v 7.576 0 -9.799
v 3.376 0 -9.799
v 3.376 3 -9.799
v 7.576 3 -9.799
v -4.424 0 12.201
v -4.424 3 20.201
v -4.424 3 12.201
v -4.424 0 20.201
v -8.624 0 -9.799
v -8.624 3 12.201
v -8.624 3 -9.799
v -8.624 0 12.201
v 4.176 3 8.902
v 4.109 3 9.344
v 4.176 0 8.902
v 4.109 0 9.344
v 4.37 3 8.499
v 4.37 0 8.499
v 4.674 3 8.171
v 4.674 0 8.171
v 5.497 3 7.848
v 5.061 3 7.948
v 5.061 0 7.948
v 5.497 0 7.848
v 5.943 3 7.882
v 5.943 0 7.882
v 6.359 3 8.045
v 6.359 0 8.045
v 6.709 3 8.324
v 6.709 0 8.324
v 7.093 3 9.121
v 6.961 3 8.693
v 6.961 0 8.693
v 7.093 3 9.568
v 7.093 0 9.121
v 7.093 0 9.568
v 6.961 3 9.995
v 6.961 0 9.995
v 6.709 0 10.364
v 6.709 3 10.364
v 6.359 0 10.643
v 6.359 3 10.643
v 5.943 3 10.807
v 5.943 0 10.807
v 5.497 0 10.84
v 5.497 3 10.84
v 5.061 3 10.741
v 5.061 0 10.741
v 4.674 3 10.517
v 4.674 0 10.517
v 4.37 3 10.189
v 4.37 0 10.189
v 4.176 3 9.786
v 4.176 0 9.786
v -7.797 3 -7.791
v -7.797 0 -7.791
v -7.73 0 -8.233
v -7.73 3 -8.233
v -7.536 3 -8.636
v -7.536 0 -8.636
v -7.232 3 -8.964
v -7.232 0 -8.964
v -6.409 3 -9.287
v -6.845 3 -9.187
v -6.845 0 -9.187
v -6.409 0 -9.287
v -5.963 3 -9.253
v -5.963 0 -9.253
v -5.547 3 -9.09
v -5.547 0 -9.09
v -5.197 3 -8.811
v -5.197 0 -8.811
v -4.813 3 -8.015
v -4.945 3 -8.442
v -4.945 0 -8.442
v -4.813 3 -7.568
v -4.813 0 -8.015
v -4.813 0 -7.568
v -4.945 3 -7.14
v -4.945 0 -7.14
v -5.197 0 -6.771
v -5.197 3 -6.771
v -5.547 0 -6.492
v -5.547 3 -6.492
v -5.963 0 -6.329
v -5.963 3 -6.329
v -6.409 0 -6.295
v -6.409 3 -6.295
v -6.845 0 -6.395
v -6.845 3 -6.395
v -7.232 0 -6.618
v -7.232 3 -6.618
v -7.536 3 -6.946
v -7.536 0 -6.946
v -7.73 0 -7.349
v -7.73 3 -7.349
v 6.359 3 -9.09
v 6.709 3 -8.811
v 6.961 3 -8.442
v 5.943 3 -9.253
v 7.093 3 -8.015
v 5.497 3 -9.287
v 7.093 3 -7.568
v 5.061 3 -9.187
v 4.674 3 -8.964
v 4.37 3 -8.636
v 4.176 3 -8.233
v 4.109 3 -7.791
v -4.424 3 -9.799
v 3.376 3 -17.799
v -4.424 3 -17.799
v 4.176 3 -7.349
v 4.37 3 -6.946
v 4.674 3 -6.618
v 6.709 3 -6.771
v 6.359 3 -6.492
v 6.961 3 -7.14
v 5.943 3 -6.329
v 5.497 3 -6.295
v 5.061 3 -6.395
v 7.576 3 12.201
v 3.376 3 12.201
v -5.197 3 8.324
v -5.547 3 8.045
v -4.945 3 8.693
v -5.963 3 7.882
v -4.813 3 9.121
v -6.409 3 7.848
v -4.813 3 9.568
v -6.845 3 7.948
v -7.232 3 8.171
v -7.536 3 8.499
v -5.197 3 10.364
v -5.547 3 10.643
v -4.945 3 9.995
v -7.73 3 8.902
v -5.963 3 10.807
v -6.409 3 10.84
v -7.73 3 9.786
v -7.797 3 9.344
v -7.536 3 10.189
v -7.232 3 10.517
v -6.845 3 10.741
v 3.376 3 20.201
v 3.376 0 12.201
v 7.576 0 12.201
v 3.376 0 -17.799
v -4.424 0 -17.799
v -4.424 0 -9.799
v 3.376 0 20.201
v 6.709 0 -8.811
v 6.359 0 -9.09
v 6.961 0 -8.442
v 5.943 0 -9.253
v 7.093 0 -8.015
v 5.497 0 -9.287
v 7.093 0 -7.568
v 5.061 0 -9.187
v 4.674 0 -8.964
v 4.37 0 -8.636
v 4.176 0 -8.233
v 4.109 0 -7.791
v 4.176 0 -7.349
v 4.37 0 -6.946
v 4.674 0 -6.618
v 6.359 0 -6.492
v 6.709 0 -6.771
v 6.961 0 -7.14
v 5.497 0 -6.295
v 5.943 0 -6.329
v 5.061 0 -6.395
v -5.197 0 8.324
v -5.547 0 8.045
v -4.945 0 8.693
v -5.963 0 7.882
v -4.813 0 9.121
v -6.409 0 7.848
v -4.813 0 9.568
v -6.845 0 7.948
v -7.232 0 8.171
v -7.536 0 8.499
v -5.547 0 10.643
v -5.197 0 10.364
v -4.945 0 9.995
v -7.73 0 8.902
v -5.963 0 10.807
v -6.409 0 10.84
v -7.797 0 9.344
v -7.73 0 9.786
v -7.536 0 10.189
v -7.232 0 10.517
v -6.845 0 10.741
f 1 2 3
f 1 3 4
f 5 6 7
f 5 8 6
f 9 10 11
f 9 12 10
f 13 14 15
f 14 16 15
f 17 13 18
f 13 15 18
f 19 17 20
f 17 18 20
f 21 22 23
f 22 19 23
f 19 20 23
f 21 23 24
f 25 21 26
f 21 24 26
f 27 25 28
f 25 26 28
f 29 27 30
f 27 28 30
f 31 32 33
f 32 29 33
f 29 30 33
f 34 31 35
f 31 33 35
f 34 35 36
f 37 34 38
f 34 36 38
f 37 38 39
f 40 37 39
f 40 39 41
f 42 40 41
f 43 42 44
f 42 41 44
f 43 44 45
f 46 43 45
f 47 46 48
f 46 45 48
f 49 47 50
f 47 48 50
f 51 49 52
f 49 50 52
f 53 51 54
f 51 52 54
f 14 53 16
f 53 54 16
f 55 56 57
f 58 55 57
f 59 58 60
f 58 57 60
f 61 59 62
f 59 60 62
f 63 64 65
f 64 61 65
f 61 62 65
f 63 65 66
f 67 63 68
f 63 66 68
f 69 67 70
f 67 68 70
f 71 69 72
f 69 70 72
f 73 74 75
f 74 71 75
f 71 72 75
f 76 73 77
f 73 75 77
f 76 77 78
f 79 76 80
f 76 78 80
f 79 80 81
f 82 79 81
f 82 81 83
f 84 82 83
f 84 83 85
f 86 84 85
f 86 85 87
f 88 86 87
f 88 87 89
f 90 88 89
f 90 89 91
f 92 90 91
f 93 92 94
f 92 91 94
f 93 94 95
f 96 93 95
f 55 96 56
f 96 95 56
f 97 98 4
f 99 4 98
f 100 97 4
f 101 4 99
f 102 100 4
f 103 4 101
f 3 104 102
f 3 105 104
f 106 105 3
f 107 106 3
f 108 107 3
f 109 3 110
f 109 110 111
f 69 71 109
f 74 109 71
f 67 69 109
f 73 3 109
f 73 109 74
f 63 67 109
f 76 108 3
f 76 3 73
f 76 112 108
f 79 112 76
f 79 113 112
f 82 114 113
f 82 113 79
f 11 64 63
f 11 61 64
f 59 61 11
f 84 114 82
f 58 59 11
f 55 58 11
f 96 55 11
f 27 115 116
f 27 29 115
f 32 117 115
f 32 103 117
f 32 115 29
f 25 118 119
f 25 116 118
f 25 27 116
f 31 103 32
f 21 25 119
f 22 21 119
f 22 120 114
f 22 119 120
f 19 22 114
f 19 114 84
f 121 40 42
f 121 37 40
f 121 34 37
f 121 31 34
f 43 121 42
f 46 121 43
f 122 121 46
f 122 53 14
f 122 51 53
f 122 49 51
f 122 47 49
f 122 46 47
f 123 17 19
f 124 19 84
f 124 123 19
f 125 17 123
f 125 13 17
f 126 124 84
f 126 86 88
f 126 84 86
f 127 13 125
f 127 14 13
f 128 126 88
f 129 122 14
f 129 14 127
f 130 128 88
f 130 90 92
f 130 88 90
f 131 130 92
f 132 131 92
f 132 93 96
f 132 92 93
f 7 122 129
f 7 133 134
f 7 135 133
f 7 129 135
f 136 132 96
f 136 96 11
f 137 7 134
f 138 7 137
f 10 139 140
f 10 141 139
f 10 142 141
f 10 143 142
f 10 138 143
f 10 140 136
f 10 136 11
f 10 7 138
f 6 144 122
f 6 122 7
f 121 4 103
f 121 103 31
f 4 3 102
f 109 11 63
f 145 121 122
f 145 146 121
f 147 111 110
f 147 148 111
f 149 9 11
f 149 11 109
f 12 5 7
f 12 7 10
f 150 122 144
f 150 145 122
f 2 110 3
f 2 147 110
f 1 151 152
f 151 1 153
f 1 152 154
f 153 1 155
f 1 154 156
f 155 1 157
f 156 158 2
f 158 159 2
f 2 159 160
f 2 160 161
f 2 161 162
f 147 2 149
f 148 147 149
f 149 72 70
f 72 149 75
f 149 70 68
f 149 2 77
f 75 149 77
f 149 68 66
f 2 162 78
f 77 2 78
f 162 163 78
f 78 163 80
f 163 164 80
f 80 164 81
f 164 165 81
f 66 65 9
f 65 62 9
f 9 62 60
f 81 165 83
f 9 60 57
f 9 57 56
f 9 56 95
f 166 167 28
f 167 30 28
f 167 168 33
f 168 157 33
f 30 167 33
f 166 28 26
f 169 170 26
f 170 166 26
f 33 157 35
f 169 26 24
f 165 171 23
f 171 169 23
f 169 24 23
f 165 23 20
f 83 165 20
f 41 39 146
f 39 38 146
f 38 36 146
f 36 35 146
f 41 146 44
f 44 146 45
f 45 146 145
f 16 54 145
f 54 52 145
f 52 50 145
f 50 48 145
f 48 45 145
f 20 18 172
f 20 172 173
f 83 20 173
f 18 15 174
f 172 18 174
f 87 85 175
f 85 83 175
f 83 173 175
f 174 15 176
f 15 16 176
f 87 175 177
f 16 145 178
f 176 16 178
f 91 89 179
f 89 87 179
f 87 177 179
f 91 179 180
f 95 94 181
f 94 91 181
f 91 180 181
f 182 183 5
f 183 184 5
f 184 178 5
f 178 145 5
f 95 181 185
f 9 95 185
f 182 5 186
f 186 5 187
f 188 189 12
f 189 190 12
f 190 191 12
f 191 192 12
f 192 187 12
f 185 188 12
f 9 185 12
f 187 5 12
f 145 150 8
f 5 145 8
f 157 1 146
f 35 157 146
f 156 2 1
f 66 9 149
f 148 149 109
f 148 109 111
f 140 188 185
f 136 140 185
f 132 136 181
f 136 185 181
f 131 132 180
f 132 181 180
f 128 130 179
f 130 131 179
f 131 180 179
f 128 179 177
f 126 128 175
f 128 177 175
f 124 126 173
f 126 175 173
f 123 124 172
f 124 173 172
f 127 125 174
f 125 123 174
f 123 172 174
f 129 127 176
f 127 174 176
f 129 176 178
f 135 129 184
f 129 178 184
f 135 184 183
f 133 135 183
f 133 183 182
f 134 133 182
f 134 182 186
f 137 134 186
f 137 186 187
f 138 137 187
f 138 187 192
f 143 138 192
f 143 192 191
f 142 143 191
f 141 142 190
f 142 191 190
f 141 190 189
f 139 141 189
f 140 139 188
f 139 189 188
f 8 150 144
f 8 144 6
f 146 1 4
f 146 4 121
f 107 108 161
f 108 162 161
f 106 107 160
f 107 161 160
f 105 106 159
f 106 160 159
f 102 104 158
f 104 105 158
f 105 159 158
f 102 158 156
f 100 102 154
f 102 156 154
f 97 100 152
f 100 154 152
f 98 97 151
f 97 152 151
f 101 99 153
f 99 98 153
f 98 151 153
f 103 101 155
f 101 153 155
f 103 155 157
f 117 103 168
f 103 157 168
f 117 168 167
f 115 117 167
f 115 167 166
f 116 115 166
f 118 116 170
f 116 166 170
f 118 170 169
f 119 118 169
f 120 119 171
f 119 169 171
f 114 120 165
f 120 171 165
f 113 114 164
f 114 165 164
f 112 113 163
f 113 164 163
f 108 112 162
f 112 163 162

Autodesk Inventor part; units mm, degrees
ref_plane "YZ Plane" through (0, 0, 0) normal (1, 0, 0) x (0, 1, 0)
ref_plane "XZ Plane" through (0, 0, 0) normal (0, 1, 0) x (-1, 0, 0)
ref_plane "XY Plane" through (0, 0, 0) normal (0, 0, 1) x (1, 0, 0)
sketch "Эскиз1" plane through (0, 0, 0) normal (0, 1, 0) x (-1, 0, 0)
  circle A0 centre (6.2967, 9.3442) radius 1.5
  circle A1 centre (-5.6093, 9.3442) radius 1.5
  circle A2 centre (-5.6093, -7.7911) radius 1.5
  circle A3 centre (6.2967, -7.7911) radius 1.5
  line L0 (4.4235, -9.7991) -> (4.4235, -17.7991)
  line L1 (8.6235, -9.7991) -> (4.4235, -9.7991)
  line L2 (8.6235, 12.2009) -> (8.6235, -9.7991)
  line L3 (4.4235, 12.2009) -> (8.6235, 12.2009)
  line L4 (4.4235, 20.2009) -> (4.4235, 12.2009)
  line L5 (-3.3765, 20.2009) -> (4.4235, 20.2009)
  line L6 (-3.3765, 12.2009) -> (-3.3765, 20.2009)
  line L7 (-7.5765, 12.2009) -> (-3.3765, 12.2009)
  line L8 (-7.5765, -9.7991) -> (-7.5765, 12.2009)
  line L9 (-3.3765, -9.7991) -> (-7.5765, -9.7991)
  line L10 (-3.3765, -17.7991) -> (-3.3765, -9.7991)
  line L11 (4.4235, -17.7991) -> (-3.3765, -17.7991)
  point P0 (0, 0)
  point P1 (-15.7765, 1.2009)
extrude "Выдавливание1" add sketch "Эскиз1" along normal blind 3
properties part number "КВ33.044.503 - Прижим ремня" material "Пластик АБС"
